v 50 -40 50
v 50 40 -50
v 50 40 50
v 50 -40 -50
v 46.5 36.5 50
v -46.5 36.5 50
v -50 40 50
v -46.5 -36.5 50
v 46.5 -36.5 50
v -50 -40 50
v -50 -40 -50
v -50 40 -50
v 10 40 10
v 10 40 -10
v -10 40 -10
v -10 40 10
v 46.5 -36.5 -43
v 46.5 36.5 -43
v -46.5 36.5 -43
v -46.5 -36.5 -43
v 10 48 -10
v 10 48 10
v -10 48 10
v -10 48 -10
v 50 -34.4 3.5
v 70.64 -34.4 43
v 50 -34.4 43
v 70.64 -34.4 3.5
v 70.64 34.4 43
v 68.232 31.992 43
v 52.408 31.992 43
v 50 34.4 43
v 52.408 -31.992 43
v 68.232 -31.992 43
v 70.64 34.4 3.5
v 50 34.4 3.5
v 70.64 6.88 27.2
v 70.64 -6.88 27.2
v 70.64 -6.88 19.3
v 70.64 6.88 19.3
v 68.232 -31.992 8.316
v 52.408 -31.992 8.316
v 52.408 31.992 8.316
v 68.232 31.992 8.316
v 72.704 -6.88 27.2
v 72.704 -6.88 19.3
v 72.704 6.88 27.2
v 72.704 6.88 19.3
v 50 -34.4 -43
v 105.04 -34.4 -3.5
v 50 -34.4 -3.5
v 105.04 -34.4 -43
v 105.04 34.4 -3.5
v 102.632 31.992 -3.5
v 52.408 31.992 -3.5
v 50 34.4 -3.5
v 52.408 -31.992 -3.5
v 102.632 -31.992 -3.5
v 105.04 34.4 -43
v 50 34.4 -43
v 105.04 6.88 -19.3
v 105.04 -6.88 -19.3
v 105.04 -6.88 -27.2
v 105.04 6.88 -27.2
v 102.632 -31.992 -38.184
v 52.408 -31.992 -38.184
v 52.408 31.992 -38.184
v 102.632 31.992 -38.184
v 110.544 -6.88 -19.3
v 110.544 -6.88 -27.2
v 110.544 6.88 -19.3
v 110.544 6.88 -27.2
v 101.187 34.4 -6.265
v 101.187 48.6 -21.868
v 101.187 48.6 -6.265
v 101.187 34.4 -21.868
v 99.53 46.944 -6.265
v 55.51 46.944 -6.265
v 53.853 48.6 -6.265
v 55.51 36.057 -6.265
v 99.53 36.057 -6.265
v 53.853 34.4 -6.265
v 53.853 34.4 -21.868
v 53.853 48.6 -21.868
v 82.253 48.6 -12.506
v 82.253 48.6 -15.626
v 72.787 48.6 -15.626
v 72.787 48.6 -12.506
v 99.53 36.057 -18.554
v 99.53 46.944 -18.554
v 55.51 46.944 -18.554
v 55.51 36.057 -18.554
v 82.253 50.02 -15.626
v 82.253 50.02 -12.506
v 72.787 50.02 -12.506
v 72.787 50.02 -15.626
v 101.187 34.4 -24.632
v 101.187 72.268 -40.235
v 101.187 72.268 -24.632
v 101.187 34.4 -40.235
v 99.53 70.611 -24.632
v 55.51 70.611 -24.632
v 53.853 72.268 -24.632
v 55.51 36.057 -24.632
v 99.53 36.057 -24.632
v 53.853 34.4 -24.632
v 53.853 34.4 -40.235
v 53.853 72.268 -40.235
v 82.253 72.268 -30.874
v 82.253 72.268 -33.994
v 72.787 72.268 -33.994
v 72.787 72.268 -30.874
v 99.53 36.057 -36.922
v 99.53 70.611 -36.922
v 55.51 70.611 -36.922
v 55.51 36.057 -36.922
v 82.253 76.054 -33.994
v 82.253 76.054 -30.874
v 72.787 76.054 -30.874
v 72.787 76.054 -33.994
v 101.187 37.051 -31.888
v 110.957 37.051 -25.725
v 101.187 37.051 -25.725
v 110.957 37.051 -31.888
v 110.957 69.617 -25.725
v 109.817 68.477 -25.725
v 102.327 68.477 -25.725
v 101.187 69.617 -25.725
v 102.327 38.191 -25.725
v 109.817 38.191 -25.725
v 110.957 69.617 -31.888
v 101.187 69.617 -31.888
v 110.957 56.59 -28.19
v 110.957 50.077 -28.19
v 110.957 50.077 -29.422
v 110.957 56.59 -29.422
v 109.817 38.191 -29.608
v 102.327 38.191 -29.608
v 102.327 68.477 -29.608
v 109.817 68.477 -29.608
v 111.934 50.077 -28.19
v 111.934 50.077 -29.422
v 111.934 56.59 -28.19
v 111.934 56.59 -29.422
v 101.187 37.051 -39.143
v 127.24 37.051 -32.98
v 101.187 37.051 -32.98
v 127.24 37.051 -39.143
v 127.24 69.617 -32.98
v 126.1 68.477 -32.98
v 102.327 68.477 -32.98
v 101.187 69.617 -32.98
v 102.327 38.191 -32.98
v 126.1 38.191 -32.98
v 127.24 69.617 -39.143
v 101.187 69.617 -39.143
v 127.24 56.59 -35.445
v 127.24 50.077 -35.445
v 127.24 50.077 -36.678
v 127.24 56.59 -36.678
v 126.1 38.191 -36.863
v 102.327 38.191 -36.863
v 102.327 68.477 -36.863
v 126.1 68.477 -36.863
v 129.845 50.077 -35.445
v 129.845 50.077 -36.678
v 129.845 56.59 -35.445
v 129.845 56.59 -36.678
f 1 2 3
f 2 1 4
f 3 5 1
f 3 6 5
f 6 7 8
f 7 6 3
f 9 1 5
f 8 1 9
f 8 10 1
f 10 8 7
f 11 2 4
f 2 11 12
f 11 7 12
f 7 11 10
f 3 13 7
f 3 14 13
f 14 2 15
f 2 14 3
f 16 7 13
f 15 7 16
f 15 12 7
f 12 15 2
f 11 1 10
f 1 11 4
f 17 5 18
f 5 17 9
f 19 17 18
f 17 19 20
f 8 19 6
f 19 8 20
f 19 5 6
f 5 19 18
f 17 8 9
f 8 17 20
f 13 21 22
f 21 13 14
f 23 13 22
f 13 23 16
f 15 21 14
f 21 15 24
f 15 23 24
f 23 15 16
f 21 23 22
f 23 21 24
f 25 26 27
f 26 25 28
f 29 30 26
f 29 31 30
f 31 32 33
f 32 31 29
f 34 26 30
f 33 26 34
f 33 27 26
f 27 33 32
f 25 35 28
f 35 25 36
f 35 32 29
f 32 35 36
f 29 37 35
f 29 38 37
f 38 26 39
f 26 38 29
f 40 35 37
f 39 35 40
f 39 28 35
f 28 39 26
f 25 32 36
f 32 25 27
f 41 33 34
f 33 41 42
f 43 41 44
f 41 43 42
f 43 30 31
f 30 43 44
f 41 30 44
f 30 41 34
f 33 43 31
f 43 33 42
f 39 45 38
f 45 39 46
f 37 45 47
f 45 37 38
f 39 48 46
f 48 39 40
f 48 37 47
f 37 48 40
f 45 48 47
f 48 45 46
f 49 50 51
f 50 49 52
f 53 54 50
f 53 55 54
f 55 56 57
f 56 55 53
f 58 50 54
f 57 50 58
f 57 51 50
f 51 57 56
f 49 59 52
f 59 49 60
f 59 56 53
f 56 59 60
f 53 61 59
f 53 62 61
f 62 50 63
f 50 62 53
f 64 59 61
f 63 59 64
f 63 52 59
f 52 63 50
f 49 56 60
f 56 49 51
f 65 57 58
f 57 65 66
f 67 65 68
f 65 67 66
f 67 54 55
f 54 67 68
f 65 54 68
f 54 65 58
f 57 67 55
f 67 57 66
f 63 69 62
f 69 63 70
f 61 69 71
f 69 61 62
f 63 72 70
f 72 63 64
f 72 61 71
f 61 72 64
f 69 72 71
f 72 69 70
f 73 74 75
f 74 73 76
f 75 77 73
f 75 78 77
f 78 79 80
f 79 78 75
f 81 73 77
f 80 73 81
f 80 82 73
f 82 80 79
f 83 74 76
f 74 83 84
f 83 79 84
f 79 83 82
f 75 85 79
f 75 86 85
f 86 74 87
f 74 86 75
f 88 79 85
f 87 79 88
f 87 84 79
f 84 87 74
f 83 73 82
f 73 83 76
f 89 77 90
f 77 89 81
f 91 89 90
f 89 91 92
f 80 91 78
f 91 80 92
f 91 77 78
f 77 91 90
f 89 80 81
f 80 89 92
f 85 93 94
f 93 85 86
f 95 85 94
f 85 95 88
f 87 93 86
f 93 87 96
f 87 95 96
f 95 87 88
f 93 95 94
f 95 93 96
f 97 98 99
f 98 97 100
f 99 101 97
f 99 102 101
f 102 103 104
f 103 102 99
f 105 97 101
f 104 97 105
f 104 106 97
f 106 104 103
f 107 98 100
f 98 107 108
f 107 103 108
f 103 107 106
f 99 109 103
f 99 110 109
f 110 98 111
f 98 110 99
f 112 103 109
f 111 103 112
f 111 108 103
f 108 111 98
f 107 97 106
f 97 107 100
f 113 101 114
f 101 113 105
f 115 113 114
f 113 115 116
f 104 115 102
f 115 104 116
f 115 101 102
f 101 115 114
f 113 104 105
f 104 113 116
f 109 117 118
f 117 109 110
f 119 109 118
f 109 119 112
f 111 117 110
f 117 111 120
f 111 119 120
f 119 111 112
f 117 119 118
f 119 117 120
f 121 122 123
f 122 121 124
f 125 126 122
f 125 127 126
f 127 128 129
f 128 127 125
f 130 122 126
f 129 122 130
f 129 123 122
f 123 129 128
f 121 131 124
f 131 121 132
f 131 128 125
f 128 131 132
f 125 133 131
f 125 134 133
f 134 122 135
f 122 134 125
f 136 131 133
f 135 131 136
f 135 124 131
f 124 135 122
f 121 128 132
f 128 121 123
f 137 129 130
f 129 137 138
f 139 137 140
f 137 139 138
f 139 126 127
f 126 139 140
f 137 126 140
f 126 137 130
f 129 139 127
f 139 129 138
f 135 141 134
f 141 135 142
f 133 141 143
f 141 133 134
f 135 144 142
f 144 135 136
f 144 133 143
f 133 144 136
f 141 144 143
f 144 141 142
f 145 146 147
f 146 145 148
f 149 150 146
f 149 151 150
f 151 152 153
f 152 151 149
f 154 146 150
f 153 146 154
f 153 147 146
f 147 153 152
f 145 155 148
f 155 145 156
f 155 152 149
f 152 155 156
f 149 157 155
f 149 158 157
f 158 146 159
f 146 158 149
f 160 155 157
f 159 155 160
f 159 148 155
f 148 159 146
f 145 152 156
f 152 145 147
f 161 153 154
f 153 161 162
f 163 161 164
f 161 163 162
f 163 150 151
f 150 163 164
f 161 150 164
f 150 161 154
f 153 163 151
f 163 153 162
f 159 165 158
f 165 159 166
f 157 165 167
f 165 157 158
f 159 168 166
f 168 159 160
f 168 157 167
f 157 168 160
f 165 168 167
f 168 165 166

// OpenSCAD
// www.github.com/agupta231

// user set variables
initial_side_length = 100;
initial_side_height = 100;
padding_ratio = .07;

knob_ratio = .2;

max_iterations = 3;

top_opening_ratio = .3;
bottom_opening_ratio = .8;

echo(version());

module shelf(length, depth, height) {
    union() {
      difference() {
          cube([length, depth, height], center = true);

          translate([0, 0, length * padding_ratio]) {
              cube([(1 - padding_ratio) * length, depth - length * padding_ratio, height], center = true);
          }
      }

      translate([0, (1 + knob_ratio / 2) * depth / 2 ,0])
      cube([length * knob_ratio, depth * knob_ratio / 2, height * knob_ratio], center = true);
    }
}

module pattern(current_iteration, starting_pos, length, height) {
    len_padding = length * padding_ratio;
    height_padding = height * padding_ratio;

    length_new = length - 2 * len_padding;
    height_new = (height - 3 * height_padding) / 2;

    if(current_iteration % 2 == 0) {
        translate(starting_pos + [0, (length_new * top_opening_ratio) / 2, (height_new + height_padding) / 2]) {
            shelf(length_new, length_new * top_opening_ratio, height_new);
        }

        translate(starting_pos + [0, (length_new * bottom_opening_ratio) / 2, -(height_new + height_padding) / 2]) {
            shelf(length_new, length_new * bottom_opening_ratio, height_new);
        }

        if(current_iteration < max_iterations) {
            new_pos = starting_pos + [length_new / 2, length_new * bottom_opening_ratio / 2, -(height_new + height_padding) / 2];

            pattern(current_iteration + 1, new_pos, length_new * bottom_opening_ratio, height_new);
        }
    }
    else if(current_iteration % 2 == 1) {
      translate(starting_pos + [(length_new * top_opening_ratio) / 2, 0, (height_new + height_padding) / 2]) {
          rotate([0, 0, -90]) {
            shelf(length_new, length_new * top_opening_ratio, height_new);
          }
      }

      translate(starting_pos + [(length_new * bottom_opening_ratio) / 2, 0, -(height_new + height_padding) / 2]) {
          rotate([0, 0, -90]) {
            shelf(length_new, length_new * bottom_opening_ratio, height_new);
          }
      }

      if(current_iteration < max_iterations) {
          new_pos = starting_pos + [length_new * bottom_opening_ratio / 2, length_new / 2, -(height_new + height_padding) / 2];

          pattern(current_iteration + 1, new_pos, length_new * bottom_opening_ratio, height_new);
      }
    }
}

shelf(initial_side_length, initial_side_length * bottom_opening_ratio, initial_side_height);

pattern(1, [initial_side_length / 2, 0, 0], initial_side_length * bottom_opening_ratio, initial_side_height);
